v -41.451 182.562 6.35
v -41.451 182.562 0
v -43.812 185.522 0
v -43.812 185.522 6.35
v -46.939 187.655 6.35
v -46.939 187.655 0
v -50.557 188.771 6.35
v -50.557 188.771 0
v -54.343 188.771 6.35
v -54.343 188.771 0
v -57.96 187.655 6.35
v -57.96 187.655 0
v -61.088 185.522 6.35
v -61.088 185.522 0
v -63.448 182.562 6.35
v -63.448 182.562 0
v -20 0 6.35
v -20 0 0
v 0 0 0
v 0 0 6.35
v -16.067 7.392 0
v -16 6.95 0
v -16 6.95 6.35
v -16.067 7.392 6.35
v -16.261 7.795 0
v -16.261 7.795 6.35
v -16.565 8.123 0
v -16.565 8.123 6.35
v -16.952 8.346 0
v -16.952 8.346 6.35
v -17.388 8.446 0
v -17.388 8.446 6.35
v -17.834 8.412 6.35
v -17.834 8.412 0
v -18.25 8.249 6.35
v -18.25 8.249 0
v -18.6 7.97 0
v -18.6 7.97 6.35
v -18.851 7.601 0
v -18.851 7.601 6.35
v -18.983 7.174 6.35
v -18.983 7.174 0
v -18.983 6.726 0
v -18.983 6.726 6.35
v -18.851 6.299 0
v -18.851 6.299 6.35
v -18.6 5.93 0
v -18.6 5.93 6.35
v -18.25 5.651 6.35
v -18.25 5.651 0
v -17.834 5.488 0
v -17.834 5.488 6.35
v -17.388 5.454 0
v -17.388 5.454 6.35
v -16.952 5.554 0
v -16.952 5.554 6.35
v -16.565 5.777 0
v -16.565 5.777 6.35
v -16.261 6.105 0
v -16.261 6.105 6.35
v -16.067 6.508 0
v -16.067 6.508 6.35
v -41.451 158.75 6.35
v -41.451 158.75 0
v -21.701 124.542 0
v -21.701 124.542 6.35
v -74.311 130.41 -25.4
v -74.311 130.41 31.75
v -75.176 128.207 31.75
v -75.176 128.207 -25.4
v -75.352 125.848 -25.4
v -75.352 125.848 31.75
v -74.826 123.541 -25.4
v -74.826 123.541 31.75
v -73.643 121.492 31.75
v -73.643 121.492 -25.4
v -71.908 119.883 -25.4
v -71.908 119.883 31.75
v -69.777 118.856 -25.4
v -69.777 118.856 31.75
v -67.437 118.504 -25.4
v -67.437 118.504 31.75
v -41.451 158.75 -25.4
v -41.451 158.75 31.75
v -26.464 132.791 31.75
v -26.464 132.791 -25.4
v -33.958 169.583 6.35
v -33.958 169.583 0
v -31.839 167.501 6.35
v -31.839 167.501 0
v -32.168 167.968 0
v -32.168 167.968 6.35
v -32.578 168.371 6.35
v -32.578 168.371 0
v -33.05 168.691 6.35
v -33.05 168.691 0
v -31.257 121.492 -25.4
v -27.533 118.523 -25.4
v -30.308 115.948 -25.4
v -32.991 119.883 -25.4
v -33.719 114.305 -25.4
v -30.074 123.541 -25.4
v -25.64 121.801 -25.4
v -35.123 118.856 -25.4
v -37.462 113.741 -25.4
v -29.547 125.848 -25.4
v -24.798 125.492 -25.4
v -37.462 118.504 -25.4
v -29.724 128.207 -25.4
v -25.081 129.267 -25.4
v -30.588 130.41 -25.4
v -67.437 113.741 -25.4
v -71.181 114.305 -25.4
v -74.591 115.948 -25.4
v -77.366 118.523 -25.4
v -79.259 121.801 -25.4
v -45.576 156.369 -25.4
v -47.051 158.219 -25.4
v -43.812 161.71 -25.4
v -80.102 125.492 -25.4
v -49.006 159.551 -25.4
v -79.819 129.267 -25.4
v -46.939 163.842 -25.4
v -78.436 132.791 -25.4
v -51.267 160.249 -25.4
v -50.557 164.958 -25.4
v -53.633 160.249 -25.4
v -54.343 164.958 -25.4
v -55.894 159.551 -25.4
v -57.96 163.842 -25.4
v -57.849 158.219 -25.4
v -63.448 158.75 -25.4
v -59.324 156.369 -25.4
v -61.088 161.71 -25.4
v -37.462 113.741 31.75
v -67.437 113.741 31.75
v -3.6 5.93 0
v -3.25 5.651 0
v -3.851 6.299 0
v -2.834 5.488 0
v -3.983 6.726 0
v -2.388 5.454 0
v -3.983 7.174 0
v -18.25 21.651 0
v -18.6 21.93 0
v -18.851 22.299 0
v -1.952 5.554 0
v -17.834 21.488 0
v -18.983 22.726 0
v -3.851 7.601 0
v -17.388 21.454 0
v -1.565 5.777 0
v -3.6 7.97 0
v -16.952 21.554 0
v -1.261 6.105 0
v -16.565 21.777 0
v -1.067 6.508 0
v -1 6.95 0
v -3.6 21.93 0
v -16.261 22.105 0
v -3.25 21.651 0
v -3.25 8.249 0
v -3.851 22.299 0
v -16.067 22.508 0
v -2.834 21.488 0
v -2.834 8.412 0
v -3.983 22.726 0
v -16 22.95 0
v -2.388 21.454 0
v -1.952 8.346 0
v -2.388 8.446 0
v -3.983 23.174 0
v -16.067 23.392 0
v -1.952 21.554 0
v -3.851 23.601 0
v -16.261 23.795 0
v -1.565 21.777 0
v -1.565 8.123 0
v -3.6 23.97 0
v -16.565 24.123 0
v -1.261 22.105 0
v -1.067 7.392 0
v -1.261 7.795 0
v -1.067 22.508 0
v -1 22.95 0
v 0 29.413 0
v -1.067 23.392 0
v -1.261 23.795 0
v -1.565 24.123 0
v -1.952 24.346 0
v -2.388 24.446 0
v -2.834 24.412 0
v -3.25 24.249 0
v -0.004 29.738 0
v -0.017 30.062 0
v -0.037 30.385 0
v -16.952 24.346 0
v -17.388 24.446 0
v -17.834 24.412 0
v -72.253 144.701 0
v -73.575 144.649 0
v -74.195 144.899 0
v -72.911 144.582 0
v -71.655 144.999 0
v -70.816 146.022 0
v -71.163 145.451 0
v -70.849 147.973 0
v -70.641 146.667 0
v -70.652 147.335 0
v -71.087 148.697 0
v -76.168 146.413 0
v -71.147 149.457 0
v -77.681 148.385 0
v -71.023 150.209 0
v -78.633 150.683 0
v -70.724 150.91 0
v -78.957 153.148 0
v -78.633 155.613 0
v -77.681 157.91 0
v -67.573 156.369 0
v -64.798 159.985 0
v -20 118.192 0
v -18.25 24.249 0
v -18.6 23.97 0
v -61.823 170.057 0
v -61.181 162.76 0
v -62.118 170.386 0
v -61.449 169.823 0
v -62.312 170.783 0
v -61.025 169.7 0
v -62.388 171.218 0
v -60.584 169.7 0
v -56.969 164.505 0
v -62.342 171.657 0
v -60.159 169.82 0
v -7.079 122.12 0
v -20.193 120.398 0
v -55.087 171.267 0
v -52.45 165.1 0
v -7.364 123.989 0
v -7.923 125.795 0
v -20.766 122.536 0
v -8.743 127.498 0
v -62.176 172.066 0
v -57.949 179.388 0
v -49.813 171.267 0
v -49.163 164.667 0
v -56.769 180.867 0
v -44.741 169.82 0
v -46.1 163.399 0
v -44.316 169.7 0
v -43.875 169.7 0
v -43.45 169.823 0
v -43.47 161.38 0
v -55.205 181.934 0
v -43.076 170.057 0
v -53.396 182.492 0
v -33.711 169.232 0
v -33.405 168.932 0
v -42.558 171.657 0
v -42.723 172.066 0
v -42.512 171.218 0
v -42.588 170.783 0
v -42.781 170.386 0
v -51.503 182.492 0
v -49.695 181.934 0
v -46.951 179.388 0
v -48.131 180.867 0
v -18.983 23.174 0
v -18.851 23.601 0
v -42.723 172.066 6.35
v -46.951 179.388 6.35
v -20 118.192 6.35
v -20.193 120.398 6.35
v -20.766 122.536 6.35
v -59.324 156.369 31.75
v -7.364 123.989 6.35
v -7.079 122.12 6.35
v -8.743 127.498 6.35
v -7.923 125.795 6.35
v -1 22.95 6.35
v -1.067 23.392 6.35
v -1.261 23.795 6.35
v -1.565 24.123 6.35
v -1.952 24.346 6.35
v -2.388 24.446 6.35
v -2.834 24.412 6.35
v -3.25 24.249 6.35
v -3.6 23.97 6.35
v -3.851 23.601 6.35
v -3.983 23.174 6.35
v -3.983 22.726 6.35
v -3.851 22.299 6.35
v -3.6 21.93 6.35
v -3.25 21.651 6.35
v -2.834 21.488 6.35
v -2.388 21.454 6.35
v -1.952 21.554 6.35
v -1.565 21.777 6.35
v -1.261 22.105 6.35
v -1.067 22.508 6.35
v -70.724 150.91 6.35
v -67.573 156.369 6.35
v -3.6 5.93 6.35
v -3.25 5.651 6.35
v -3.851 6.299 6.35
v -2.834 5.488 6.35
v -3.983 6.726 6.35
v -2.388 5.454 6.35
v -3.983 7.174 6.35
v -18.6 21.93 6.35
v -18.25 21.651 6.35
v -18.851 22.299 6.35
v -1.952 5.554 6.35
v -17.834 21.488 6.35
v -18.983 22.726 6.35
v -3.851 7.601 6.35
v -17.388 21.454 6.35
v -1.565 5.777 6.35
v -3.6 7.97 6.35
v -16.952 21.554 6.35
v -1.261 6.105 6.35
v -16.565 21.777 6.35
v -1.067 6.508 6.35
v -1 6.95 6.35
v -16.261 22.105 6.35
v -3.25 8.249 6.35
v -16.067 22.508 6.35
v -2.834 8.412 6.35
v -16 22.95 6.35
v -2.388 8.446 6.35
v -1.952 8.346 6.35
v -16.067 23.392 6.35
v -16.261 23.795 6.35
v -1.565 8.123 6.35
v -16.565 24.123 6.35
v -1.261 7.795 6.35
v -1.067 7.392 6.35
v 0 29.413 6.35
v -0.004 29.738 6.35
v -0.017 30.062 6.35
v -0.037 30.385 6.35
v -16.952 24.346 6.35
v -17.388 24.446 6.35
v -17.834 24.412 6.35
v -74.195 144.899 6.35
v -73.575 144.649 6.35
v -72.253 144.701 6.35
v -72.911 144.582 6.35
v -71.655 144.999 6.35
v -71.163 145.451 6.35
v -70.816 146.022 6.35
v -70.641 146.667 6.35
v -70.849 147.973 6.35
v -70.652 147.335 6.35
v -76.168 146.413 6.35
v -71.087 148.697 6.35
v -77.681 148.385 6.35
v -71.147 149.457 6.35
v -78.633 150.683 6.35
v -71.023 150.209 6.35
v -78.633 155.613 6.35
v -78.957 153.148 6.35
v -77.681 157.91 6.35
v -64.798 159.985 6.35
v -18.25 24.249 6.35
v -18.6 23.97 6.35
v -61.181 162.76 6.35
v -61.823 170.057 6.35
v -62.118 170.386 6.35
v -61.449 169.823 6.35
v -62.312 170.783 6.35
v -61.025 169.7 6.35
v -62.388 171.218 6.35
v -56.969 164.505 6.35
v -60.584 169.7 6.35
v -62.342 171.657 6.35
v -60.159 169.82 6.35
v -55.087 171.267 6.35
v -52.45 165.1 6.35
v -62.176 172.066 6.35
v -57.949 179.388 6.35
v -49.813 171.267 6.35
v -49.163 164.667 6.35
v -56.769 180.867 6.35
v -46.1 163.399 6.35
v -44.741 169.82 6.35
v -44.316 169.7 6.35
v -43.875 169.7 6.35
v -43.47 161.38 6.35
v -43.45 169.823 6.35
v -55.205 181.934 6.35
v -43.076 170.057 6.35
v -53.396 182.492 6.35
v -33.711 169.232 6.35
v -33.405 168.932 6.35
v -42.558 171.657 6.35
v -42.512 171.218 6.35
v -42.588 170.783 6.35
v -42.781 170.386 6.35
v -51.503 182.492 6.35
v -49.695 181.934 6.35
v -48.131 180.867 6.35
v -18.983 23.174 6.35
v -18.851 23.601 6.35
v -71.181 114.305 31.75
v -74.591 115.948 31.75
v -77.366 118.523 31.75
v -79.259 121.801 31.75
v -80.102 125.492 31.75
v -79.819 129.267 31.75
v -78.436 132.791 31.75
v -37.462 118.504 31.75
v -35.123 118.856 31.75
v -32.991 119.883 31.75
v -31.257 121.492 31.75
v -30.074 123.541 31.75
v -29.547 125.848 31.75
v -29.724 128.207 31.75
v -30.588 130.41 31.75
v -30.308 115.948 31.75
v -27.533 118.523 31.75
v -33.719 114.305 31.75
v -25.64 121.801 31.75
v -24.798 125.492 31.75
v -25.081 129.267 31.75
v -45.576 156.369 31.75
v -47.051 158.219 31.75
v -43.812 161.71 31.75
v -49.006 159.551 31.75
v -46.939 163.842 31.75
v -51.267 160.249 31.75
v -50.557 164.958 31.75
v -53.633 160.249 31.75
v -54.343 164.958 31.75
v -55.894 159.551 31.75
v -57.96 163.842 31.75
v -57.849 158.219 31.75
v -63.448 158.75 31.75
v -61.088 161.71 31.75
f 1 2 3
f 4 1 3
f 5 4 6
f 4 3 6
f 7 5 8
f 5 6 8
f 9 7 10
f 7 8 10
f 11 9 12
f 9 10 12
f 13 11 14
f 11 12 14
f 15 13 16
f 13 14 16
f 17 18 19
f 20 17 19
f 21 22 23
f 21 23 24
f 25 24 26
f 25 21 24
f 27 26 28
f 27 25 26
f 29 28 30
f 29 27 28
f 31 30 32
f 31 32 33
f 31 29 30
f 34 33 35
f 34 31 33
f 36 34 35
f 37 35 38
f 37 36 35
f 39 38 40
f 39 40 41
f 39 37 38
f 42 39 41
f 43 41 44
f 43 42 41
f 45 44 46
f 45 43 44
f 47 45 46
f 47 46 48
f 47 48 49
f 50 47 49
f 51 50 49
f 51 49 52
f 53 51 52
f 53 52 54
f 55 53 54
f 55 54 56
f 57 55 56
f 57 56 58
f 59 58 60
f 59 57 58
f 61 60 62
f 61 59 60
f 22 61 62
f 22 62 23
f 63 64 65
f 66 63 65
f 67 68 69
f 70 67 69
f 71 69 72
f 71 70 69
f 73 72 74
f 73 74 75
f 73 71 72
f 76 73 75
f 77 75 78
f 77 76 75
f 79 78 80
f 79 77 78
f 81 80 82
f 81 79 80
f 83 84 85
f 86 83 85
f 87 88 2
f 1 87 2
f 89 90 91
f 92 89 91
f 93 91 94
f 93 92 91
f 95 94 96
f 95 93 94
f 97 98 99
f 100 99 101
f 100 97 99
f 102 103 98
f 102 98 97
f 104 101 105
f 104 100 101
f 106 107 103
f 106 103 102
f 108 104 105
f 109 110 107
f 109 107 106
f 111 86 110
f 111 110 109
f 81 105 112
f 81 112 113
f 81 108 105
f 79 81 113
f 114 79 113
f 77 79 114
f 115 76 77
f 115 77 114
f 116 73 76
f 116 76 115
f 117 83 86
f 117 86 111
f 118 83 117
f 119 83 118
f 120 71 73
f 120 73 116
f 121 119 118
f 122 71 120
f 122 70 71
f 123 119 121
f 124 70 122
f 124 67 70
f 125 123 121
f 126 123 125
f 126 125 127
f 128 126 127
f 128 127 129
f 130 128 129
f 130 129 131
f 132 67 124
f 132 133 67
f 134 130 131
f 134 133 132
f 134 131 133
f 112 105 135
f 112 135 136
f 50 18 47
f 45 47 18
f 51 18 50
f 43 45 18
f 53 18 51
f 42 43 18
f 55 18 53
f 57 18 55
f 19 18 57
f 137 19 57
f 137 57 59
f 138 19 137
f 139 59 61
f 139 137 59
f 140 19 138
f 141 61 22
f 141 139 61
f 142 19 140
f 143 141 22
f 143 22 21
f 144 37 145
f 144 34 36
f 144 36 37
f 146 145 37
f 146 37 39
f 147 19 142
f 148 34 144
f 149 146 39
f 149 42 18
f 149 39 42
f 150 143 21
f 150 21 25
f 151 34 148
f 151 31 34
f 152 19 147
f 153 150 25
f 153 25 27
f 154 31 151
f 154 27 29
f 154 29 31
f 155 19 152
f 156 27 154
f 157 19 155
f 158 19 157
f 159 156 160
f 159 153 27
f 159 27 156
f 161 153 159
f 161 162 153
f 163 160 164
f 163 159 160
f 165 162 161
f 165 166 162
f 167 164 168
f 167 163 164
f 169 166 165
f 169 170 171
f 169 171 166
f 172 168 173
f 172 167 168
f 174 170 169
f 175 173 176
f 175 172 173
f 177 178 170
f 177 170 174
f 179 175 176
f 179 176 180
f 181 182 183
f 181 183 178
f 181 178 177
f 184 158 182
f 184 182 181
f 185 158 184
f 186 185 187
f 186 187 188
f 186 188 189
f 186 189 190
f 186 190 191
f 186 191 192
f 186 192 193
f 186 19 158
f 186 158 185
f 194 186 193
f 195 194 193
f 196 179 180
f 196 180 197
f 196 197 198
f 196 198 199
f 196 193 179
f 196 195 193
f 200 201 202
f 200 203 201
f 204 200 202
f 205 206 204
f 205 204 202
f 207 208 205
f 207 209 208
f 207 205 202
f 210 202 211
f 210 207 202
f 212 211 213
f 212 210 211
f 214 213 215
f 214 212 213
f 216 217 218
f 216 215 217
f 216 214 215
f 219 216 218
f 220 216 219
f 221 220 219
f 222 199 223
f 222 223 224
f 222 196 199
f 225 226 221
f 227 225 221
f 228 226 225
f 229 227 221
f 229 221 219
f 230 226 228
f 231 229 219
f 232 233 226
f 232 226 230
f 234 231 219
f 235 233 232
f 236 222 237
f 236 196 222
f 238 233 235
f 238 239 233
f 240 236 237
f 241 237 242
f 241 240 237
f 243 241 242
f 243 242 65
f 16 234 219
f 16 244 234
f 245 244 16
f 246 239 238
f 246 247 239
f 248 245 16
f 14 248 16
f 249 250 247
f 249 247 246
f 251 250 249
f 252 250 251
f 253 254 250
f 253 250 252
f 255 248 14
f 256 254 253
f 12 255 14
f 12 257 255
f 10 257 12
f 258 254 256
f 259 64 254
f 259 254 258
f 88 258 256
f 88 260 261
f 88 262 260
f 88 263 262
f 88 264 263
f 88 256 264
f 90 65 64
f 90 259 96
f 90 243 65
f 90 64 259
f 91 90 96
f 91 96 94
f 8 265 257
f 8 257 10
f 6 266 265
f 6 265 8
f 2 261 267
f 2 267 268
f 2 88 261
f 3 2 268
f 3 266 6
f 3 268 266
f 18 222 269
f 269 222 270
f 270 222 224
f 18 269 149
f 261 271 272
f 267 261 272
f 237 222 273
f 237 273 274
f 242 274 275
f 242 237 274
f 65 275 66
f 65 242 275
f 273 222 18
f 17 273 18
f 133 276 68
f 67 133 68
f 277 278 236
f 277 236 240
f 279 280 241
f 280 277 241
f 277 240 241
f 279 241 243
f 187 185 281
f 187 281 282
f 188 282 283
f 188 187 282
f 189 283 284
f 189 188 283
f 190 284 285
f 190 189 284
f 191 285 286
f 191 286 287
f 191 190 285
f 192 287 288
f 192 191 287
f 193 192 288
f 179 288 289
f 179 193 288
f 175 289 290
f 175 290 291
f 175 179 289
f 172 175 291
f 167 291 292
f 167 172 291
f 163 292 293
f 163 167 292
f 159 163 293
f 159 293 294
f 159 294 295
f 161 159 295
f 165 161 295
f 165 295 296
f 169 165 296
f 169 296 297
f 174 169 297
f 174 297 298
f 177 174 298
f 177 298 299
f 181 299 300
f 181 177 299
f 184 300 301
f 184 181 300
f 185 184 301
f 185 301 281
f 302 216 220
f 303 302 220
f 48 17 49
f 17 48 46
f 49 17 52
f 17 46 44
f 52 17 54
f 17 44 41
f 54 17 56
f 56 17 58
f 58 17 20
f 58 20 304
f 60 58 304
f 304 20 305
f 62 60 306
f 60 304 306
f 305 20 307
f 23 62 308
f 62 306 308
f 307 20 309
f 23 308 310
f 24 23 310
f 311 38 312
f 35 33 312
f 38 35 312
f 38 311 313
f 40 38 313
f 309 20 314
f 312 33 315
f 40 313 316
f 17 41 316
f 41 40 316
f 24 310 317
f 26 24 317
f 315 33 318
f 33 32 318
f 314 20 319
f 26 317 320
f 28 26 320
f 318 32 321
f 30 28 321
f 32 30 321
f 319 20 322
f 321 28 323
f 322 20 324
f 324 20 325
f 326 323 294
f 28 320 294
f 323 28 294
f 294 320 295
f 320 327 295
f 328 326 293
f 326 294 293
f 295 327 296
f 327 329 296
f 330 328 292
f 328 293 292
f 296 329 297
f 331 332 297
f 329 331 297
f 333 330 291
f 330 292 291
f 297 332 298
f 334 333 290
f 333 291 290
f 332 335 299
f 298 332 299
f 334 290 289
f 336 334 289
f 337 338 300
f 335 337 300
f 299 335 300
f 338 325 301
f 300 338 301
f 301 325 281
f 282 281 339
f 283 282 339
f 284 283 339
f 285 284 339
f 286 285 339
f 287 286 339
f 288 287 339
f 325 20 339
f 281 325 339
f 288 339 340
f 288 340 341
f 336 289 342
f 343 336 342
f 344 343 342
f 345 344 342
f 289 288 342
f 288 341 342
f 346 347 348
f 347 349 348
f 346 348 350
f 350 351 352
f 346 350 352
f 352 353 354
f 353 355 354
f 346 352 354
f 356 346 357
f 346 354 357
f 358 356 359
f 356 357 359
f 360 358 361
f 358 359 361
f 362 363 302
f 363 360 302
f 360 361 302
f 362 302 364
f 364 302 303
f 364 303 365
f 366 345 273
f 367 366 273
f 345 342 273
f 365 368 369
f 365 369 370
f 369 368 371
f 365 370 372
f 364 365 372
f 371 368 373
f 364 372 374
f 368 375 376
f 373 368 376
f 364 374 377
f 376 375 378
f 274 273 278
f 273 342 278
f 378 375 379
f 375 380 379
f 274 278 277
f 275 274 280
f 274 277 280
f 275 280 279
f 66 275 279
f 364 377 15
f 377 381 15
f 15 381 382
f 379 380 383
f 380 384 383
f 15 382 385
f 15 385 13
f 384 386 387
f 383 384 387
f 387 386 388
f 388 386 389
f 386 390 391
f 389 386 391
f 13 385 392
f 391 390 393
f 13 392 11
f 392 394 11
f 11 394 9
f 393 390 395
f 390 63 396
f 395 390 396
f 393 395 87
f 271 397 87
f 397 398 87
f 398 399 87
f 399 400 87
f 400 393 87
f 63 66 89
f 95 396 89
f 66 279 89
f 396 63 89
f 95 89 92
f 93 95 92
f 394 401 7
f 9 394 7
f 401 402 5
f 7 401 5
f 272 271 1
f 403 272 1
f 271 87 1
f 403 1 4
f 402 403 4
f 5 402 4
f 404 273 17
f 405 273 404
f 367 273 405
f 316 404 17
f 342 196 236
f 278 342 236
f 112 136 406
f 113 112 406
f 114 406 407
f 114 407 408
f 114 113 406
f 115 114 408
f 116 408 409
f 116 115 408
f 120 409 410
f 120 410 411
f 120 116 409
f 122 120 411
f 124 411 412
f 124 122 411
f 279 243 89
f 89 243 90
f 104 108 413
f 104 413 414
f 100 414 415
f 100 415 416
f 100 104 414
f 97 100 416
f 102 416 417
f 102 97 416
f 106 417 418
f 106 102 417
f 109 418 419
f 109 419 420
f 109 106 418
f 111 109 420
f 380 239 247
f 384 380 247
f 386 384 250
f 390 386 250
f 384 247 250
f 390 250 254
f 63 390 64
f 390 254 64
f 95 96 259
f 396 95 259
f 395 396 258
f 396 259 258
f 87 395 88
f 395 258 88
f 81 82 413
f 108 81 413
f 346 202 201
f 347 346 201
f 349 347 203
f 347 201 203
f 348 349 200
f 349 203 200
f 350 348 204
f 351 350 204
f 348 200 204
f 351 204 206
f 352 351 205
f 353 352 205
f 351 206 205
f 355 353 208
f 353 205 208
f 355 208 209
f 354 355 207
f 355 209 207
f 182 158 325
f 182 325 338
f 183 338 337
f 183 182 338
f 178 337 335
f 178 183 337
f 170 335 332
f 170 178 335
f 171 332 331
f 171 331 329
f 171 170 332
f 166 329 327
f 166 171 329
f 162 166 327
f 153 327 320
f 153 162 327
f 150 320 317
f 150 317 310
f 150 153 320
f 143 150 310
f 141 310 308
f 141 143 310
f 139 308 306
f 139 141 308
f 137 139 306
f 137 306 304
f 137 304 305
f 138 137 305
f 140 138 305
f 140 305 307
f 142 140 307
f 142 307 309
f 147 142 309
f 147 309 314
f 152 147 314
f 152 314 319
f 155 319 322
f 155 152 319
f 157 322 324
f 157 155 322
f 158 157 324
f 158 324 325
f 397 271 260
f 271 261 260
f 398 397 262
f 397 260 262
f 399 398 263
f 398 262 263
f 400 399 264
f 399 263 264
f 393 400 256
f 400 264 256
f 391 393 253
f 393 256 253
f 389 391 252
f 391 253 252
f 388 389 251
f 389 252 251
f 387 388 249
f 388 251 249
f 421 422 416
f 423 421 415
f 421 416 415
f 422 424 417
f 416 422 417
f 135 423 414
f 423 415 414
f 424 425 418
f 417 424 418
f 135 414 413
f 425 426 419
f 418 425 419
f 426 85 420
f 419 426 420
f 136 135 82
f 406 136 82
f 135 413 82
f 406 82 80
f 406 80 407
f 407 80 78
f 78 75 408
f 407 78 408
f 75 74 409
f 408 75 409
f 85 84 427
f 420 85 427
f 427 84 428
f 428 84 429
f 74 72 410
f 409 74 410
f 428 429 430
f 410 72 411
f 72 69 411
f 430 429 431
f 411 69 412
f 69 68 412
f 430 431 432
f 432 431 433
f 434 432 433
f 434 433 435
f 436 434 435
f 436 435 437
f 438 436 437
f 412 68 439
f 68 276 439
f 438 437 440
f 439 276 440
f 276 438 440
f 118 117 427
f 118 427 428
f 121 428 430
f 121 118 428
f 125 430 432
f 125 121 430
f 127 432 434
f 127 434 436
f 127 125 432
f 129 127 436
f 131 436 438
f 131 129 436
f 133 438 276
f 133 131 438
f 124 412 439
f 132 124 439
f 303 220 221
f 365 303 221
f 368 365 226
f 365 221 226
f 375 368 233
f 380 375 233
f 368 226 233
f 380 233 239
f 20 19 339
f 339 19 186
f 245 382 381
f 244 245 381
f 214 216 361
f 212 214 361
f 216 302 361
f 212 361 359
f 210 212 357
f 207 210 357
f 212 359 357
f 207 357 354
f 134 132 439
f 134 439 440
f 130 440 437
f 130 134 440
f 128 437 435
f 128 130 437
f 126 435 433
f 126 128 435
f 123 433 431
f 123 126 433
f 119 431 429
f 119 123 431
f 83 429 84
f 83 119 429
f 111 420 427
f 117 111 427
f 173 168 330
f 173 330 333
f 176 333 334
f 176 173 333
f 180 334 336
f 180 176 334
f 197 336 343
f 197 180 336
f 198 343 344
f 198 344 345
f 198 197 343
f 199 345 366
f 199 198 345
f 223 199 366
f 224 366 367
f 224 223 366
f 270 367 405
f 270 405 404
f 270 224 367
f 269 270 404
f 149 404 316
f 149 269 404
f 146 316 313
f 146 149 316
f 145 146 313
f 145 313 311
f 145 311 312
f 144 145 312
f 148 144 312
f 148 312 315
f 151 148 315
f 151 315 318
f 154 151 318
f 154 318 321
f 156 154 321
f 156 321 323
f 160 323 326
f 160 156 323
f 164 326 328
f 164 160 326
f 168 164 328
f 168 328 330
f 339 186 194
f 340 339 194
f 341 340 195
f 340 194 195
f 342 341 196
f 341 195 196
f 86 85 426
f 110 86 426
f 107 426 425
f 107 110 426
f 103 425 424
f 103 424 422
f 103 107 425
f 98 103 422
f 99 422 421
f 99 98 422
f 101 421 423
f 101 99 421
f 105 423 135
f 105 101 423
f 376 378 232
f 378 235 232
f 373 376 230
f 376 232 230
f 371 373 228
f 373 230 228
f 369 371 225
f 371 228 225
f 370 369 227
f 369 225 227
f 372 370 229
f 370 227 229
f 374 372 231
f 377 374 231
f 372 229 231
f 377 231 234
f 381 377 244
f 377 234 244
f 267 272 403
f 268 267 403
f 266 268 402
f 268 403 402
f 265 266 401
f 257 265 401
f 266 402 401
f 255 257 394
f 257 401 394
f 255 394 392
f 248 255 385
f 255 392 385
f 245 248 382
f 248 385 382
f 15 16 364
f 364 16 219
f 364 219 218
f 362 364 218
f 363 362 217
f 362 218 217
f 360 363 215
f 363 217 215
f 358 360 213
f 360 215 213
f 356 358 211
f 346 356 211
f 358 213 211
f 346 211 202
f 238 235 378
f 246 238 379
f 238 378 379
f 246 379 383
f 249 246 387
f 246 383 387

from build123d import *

# Parameters (mm, degrees)
SKETCH1_R                = 1.5
BOSS_EXTRUDE1_DEPTH      = 6.35
FILLET1_R                = 3.175
FILLET2_R                = 12.7
CUT_EXTRUDE1_REACH       = 206.848
FILLET3_R                = 1.5875
BOSS_EXTRUDE2_DEPTH      = 25.4
BOSS_EXTRUDE2_DEPTH_BACK = 31.75


with BuildPart() as part:
    # Sketch1 → Boss-Extrude1 (new body)
    with BuildSketch(Plane.XY):
        with BuildLine():
            Line((0, 0), (0, 29.9))
            Line((0, 29.9), (-7.3, 124.998217517))
            Line((-7.3, 124.998217517), (-32.380181769, 168.438366604))
            Line((-32.380181769, 168.438366604), (-32.511727314, 168.473614126))
            ThreePointArc((-32.511727314, 168.473614126), (-33.345027616, 168.884552358), (-33.957637456, 169.5831))
            Line((-33.957637456, 169.5831), (-41.45129754, 182.5625))
            ThreePointArc((-41.45129754, 182.5625), (-52.449820168, 188.9125), (-63.448342796, 182.5625))
            Line((-63.448342796, 182.5625), (-77.681242844, 157.910393978))
            ThreePointArc((-77.681242844, 157.910393978), (-78.632794368, 150.682642574), (-74.194850873, 144.899002007))
            ThreePointArc((-74.194850873, 144.899002007), (-70.94200288, 145.7706), (-71.813600873, 149.023447993))
            Line((-71.813600873, 149.023447993), (-67.572788781, 156.36875))
            ThreePointArc((-67.572788781, 156.36875), (-61.181070168, 162.760468614), (-52.449820168, 165.1))
            ThreePointArc((-52.449820168, 165.1), (-46.099820168, 163.398522628), (-41.45129754, 158.75))
            Line((-41.45129754, 158.75), (-20, 121.595262773))
            Line((-20, 121.595262773), (-20, 0))
            Line((-20, 0), (0, 0))
        make_face()
        with Locations((-2.5, 22.95)):
            Circle(SKETCH1_R, mode=Mode.SUBTRACT)
        with Locations((-2.5, 6.95)):
            Circle(SKETCH1_R, mode=Mode.SUBTRACT)
        with Locations((-17.5, 6.95)):
            Circle(SKETCH1_R, mode=Mode.SUBTRACT)
        with Locations((-17.5, 22.95)):
            Circle(SKETCH1_R, mode=Mode.SUBTRACT)
    extrude(amount=BOSS_EXTRUDE1_DEPTH)

    # Fillet1
    fillet1_edges = [part.edges().sort_by_distance(p)[0] for p in [
        (-32.380181769, 168.438366604, 3.175),
        (-71.813600873, 149.023447993, 3.175),
    ]]
    fillet(fillet1_edges, radius=FILLET1_R)

    # Fillet2
    # the kernel refuses this fillet: 12.7 mm, written as the material it adds along each edge
    with BuildSketch(Plane(origin=(-20, 121.595262773, 0), x_dir=(0, -1, 0), z_dir=(0, 0, 1))) as fillet2_piece_1:
        with BuildLine():
            CenterArc((FILLET2_R * 0.267949192431, -FILLET2_R), FILLET2_R, 90, 30)
            Line((-FILLET2_R * 0.232050807569, -FILLET2_R * 0.133974596216), (0, 0))
            Line((0, 0), (FILLET2_R * 0.267949192431, 0))
        make_face()
    extrude(amount=6.35)
    # the kernel refuses this fillet: 12.7 mm, written as the material it takes off along each edge
    with BuildSketch(Plane(origin=(-7.3, 124.998217517, -7.216461282), x_dir=(-0.5000000000000012, 0.866025403784438, 0), z_dir=(0, 0, 1))) as fillet2_2_piece_1:
        with BuildLine():
            CenterArc((FILLET2_R * 0.227290119104, FILLET2_R), FILLET2_R, 244.389572805, 25.610427195)
            Line((-FILLET2_R * 0.204959746031, FILLET2_R * 0.0982461233291), (0, 0))
            Line((0, 0), (FILLET2_R * 0.227290119104, 0))
        make_face()
    extrude(amount=20.782922563, mode=Mode.SUBTRACT)
    with BuildSketch(Plane(origin=(0, 29.9, -1.216818641), x_dir=(-0.07653757434641197, 0.9970666977254669, 0), z_dir=(0, 0, 1))) as fillet2_2_piece_2:
        with BuildLine():
            CenterArc((FILLET2_R * 0.038324996573, FILLET2_R), FILLET2_R, 265.610427195, 4.389572805)
            Line((-FILLET2_R * 0.0382125777734, FILLET2_R * 0.00293330227453), (0, 0))
            Line((0, 0), (FILLET2_R * 0.038324996573, 0))
        make_face()
    extrude(amount=8.783637282, mode=Mode.SUBTRACT)

    # Sketch2 → Cut-Extrude1 (cut, up to next)
    with BuildSketch(Plane.XY.offset(6.35), mode=Mode.PRIVATE) as cut_extrude1_sk1:
        with BuildLine():
            Line((-57.949081482, 179.3875), (-65.539358526, 166.240754516))
            ThreePointArc((-65.539358526, 166.240754516), (-52.449820168, 171.45), (-39.36028181, 166.240754516))
            Line((-39.36028181, 166.240754516), (-46.950558854, 179.3875))
            ThreePointArc((-46.950558854, 179.3875), (-52.449820168, 182.5625), (-57.949081482, 179.3875))
        make_face()
    cut_extrude1_tool1 = extrude(cut_extrude1_sk1.sketch, amount=-CUT_EXTRUDE1_REACH, mode=Mode.PRIVATE) & part.part
    add(cut_extrude1_tool1.solids().sort_by_distance((-52.44982, 175.064419, 6.35))[0], mode=Mode.SUBTRACT)

    # Fillet3
    fillet3_edges = [part.edges().sort_by_distance(p)[0] for p in [
        (-39.36028181, 166.240754516, 3.175),
        (-65.539358526, 166.240754516, 3.175),
    ]]
    fillet(fillet3_edges, radius=FILLET3_R)


with BuildPart() as body_2:
    # Sketch3 → Boss-Extrude2 (new, two sides: drawn at the far end of the back side and taken through both)
    with BuildSketch(Plane.XY.offset(6.35).offset(-BOSS_EXTRUDE2_DEPTH_BACK)):
        with BuildLine():
            Line((-41.45129754, 158.75), (-26.463977372, 132.7912))
            ThreePointArc((-26.463977372, 132.7912), (-26.463977372, 120.0912), (-37.4625, 113.7412))
            Line((-37.4625, 113.7412), (-67.437140336, 113.7412))
            ThreePointArc((-67.437140336, 113.7412), (-78.435662964, 120.0912), (-78.435662964, 132.7912))
            Line((-78.435662964, 132.7912), (-63.448342796, 158.75))
            ThreePointArc((-63.448342796, 158.75), (-52.449820168, 165.1), (-41.45129754, 158.75))
        make_face()
        with BuildLine():
            Line((-67.437140336, 118.5037), (-37.4625, 118.5037))
            ThreePointArc((-37.4625, 118.5037), (-30.588423357, 122.47245), (-30.588423357, 130.40995))
            Line((-30.588423357, 130.40995), (-45.575743525, 156.36875))
            ThreePointArc((-45.575743525, 156.36875), (-52.449820168, 160.3375), (-59.32389681, 156.36875))
            Line((-59.32389681, 156.36875), (-74.311216978, 130.40995))
            ThreePointArc((-74.311216978, 130.40995), (-74.311216978, 122.47245), (-67.437140336, 118.5037))
        make_face(mode=Mode.SUBTRACT)
    extrude(amount=BOSS_EXTRUDE2_DEPTH + BOSS_EXTRUDE2_DEPTH_BACK)


solid = Compound([part.part, body_2.part])
